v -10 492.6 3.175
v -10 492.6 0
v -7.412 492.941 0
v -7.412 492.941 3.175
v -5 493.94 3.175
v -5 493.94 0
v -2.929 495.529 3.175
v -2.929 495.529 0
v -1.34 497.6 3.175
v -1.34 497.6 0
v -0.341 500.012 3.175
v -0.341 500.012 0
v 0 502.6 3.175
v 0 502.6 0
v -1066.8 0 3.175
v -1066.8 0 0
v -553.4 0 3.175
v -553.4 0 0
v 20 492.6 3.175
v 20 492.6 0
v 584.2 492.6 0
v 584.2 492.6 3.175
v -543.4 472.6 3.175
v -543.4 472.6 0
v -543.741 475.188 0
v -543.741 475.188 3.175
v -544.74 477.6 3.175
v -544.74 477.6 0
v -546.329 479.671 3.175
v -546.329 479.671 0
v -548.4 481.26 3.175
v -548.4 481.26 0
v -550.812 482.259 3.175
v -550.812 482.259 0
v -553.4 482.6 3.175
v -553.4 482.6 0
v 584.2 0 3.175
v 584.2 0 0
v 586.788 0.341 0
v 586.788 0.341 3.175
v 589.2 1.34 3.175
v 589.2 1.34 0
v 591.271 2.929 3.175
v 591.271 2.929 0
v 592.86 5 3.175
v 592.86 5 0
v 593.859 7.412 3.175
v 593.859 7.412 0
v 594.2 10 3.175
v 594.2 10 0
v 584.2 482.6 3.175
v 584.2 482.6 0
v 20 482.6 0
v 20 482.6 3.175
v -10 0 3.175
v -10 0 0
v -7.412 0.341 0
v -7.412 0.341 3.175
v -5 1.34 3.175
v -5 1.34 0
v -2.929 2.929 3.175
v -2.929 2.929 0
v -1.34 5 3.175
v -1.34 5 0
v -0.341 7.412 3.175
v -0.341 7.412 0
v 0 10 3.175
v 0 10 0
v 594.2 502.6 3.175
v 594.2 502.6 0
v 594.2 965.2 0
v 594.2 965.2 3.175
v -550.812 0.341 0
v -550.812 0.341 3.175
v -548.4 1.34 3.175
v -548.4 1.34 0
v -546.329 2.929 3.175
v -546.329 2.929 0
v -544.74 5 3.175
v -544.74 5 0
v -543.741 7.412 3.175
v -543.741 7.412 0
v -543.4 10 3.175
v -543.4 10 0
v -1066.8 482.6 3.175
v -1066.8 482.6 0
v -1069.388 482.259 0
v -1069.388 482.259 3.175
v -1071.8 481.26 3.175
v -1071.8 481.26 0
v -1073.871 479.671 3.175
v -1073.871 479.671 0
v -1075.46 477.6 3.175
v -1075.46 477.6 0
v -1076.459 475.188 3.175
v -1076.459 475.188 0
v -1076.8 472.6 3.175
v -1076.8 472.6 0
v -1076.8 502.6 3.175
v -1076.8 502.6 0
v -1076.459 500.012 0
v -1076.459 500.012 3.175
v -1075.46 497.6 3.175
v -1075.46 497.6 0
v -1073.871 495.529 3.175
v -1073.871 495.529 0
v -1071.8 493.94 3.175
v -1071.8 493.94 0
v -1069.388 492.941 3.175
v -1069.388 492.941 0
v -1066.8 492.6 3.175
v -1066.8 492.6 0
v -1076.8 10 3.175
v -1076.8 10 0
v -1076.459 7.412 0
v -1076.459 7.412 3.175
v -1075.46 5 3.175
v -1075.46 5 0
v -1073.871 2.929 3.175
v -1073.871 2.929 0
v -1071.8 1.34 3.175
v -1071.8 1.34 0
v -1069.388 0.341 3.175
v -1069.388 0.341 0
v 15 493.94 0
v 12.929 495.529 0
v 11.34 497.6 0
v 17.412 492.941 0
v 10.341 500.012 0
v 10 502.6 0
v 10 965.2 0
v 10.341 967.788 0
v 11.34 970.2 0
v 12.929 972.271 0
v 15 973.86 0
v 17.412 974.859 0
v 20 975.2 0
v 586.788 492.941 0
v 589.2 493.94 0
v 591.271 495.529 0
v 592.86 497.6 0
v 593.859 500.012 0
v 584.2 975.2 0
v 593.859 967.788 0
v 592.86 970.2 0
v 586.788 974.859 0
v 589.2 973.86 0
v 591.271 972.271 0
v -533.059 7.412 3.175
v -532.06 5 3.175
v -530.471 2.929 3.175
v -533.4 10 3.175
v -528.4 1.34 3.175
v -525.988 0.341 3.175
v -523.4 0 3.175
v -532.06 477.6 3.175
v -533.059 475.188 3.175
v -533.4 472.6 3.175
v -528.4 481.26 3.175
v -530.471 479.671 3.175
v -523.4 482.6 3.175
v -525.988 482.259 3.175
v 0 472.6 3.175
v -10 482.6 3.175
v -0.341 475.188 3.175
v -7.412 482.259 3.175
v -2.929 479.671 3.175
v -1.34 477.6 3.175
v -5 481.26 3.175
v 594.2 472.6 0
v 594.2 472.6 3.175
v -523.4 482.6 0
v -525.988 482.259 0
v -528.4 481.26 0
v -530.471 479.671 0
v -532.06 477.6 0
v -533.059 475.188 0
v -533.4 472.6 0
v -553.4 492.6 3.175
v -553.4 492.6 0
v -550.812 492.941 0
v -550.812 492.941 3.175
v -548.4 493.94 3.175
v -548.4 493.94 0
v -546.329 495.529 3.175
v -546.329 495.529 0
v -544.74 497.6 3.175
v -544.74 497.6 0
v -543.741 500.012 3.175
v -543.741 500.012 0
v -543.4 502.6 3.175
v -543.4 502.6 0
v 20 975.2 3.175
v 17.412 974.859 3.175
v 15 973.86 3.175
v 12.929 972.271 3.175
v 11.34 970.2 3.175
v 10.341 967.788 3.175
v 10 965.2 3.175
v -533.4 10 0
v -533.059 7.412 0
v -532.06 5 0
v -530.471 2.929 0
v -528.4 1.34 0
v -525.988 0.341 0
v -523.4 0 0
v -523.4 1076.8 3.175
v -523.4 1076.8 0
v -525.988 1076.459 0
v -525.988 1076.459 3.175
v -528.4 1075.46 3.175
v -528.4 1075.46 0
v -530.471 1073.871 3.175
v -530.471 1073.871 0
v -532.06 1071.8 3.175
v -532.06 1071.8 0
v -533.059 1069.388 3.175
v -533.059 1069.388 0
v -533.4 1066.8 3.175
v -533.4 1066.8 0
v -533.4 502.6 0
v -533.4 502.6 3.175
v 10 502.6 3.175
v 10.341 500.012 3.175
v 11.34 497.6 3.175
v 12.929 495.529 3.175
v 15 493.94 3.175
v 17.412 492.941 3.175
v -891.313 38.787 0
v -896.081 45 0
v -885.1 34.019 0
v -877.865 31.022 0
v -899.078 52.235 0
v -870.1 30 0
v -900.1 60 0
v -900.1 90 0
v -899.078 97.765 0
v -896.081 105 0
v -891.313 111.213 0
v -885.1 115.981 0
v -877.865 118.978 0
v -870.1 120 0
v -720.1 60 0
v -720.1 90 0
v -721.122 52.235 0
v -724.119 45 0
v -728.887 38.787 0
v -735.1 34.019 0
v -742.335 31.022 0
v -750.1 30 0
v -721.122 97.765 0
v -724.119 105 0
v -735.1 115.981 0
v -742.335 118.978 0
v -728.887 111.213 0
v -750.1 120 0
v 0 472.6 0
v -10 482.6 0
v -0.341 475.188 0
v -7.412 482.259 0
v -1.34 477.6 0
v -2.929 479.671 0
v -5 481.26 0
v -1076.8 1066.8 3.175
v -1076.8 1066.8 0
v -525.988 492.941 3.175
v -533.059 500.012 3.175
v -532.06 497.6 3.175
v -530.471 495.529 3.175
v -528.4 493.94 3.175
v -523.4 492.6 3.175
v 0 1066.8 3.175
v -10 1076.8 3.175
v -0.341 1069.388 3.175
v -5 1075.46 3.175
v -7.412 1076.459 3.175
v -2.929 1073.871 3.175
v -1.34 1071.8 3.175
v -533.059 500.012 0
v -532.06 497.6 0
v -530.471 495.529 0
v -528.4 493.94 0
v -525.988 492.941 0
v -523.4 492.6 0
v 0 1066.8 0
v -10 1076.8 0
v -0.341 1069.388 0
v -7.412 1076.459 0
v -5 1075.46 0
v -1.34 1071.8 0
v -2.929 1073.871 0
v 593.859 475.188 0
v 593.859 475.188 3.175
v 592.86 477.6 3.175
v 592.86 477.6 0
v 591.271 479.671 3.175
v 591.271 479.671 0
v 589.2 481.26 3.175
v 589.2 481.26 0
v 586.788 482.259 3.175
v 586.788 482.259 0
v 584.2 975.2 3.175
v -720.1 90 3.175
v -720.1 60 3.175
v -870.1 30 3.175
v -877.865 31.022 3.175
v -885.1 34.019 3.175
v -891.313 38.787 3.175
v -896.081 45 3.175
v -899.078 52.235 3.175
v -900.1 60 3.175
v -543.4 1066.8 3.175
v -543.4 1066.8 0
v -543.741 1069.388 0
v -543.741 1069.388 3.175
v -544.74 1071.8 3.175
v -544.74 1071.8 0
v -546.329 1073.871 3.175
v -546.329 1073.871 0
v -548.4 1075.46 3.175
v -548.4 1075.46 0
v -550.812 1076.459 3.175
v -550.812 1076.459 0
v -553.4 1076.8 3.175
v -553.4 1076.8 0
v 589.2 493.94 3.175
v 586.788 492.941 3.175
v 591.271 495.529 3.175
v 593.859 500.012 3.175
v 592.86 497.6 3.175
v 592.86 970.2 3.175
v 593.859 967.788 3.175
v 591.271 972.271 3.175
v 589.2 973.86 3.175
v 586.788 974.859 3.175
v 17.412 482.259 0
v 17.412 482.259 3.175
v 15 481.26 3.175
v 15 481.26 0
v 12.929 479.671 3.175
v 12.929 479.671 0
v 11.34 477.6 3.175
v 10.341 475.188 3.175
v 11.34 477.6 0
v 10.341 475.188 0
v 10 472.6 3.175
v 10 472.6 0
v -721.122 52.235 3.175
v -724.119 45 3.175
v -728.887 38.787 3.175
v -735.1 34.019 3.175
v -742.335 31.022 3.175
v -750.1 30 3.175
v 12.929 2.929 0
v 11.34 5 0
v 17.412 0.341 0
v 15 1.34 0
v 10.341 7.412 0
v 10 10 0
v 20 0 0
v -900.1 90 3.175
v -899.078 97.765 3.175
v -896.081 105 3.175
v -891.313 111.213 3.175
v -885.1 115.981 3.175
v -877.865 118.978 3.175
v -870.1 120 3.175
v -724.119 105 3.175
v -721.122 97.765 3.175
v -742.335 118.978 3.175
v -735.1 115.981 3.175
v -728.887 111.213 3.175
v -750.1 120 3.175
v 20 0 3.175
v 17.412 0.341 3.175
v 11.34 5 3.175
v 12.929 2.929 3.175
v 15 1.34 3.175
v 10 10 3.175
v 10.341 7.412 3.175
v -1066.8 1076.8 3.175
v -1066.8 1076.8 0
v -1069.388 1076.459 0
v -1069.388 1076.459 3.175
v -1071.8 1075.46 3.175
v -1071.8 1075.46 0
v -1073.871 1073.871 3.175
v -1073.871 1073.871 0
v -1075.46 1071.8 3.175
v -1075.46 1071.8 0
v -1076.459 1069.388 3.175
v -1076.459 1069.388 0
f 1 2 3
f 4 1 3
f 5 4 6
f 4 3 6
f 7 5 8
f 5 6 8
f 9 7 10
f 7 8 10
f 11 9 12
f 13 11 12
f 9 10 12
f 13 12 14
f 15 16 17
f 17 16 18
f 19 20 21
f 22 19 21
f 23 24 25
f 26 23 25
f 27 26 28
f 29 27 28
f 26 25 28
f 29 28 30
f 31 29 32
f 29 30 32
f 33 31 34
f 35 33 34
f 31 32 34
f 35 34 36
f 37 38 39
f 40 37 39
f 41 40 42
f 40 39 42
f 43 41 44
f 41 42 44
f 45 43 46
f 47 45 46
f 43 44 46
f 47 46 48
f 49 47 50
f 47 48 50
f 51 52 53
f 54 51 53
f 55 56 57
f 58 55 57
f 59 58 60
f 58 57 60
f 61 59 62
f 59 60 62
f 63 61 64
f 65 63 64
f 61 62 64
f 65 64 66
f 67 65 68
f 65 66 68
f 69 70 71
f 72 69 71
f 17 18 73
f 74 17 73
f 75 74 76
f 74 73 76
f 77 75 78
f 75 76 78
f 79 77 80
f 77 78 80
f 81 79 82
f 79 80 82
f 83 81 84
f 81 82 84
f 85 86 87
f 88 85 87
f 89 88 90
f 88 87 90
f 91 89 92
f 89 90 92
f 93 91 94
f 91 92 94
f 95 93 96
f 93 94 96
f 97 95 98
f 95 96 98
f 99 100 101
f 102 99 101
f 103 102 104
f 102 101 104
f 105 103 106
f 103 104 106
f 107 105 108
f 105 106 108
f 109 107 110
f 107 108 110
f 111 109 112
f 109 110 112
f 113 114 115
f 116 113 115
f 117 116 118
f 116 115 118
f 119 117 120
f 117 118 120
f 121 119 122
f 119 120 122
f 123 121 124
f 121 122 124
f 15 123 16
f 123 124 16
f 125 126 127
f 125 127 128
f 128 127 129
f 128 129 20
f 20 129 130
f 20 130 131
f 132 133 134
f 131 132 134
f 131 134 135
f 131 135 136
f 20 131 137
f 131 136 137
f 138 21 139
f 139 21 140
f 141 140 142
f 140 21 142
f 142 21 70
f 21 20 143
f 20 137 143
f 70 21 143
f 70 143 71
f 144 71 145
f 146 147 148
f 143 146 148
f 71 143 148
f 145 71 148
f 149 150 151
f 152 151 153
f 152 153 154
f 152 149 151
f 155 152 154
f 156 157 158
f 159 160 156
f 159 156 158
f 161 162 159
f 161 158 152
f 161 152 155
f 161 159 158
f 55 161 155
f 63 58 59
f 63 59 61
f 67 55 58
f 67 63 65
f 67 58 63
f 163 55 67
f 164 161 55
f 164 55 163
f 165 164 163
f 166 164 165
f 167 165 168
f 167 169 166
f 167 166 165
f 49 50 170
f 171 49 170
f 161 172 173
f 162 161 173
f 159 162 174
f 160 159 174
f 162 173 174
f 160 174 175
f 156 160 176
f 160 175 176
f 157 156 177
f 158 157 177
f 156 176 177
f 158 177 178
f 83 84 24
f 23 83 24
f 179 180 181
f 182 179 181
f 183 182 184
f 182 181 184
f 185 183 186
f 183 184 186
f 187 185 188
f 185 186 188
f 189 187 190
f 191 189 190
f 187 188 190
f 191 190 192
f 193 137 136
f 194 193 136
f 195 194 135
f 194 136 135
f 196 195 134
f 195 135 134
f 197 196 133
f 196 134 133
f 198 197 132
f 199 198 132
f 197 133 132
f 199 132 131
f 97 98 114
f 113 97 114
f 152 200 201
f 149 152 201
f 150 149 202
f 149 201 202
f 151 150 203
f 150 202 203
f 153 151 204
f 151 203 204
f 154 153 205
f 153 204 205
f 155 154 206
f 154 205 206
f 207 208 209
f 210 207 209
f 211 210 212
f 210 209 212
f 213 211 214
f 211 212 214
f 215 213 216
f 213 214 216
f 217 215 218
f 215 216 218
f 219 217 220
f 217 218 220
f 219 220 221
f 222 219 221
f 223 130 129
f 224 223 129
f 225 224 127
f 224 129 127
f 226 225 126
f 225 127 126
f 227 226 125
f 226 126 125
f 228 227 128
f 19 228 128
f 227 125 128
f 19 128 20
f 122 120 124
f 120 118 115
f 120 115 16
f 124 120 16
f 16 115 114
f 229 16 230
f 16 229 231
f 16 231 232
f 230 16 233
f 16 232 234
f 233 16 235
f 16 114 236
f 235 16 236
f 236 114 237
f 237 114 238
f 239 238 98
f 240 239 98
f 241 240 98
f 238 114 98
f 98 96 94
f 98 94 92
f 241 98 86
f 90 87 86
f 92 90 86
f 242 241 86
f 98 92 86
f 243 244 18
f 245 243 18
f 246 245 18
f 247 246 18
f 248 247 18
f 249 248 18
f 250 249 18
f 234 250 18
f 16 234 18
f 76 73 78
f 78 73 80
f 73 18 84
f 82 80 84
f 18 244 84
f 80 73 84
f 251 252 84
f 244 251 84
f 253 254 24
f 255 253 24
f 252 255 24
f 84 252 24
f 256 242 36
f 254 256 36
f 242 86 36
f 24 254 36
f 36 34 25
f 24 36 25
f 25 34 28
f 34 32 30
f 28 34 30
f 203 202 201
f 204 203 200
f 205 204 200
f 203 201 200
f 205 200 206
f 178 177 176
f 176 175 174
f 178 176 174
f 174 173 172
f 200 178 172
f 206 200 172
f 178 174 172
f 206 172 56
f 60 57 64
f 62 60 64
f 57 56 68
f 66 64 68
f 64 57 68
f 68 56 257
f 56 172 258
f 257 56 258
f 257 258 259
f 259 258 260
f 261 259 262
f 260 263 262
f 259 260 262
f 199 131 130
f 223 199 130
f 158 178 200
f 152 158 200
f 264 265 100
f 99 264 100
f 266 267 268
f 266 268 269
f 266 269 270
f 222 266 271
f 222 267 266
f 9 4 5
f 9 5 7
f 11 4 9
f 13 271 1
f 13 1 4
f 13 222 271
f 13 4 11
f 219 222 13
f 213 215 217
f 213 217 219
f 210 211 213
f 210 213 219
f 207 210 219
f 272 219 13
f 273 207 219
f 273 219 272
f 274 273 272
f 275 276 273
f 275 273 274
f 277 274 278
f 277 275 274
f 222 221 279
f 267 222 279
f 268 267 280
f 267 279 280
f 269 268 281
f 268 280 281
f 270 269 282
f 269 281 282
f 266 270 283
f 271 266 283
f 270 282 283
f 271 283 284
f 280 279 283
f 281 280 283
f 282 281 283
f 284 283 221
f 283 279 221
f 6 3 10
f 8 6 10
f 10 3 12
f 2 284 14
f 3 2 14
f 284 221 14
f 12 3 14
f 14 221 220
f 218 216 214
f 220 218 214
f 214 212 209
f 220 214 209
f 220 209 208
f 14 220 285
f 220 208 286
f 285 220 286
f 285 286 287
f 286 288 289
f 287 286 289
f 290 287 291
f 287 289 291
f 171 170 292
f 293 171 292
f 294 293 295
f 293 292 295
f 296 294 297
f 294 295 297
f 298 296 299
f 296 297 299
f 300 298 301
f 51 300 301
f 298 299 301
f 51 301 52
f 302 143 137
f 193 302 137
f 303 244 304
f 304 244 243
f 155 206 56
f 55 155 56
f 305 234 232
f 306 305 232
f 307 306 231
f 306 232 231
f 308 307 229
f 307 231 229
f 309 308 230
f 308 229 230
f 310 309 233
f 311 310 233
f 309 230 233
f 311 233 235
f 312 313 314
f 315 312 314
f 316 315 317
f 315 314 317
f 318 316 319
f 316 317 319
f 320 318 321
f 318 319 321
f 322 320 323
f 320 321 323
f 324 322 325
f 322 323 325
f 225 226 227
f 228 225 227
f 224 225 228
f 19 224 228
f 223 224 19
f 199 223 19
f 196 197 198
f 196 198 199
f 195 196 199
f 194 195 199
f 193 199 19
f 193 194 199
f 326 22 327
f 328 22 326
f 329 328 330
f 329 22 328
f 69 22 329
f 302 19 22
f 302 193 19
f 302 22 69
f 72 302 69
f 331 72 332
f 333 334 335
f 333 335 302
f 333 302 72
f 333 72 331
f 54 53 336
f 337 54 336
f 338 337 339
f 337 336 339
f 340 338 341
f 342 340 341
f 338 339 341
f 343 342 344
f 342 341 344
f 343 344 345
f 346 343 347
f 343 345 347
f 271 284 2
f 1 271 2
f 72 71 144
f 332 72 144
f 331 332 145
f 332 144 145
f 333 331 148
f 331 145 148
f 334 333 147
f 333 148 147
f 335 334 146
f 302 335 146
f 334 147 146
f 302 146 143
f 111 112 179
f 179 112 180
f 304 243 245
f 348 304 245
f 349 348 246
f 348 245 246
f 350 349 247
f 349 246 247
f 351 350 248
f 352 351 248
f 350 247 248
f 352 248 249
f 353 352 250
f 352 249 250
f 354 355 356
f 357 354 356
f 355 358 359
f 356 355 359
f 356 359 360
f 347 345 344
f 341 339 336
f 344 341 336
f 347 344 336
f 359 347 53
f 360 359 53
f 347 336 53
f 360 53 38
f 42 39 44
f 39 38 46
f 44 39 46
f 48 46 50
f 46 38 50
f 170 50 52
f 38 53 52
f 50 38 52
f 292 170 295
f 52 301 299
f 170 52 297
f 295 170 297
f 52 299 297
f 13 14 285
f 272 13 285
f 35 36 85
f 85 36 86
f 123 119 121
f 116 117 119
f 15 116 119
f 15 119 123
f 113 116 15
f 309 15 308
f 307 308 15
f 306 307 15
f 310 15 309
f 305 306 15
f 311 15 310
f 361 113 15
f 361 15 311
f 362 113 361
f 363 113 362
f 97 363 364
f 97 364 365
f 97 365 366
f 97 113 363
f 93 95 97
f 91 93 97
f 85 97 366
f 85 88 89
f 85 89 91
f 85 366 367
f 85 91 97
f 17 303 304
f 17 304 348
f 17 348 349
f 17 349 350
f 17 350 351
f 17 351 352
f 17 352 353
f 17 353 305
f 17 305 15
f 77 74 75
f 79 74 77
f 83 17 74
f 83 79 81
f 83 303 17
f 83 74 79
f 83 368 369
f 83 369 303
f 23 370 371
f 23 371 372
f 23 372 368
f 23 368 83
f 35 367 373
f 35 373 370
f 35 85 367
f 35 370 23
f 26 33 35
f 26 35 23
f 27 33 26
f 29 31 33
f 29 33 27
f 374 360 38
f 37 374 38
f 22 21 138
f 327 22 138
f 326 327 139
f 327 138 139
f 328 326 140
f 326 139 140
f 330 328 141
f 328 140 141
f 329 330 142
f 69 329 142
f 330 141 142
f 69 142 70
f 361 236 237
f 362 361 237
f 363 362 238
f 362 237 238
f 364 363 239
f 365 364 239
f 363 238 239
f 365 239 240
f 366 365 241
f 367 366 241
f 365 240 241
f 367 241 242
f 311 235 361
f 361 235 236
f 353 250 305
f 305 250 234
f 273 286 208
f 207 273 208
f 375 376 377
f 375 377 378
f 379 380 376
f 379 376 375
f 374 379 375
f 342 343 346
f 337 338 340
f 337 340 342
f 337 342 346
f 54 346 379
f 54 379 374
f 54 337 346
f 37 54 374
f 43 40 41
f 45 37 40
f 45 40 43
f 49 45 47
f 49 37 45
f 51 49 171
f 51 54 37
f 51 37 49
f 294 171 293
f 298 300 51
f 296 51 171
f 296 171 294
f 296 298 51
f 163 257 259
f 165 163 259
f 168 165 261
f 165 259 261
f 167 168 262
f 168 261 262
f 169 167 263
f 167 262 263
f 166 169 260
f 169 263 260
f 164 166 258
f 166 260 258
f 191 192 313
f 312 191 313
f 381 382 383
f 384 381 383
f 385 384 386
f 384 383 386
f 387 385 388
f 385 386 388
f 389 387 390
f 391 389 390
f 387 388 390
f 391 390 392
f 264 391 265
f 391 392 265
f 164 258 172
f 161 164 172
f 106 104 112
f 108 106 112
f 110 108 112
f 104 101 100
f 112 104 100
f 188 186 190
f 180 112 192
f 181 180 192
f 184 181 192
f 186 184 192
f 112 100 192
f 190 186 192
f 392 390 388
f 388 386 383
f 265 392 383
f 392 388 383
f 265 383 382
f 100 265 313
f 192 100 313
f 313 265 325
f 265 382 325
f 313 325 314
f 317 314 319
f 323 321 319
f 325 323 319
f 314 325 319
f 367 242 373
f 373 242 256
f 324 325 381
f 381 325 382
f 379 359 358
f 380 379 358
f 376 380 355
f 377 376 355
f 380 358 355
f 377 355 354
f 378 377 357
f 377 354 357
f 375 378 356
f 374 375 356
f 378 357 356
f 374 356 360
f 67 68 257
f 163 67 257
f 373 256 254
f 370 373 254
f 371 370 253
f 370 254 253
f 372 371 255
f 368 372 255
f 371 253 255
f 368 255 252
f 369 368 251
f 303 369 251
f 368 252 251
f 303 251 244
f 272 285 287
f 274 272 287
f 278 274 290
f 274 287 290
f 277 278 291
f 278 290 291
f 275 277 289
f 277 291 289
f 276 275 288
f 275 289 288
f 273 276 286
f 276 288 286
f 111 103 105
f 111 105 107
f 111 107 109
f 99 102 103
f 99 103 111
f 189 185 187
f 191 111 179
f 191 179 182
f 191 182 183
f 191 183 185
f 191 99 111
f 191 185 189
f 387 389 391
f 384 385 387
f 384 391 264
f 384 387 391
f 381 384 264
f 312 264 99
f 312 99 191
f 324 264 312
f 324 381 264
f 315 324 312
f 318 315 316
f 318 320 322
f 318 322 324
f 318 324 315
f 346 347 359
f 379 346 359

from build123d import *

# Parameters (mm, degrees)
F1_DEPTH = 3.175


# Not quite as in the source:
# - a length typed as a fraction of an inch, garbled in the dataset ("3 / 203.2 mm" for 3/8 in), is restored
# - a feature names something its author has since deleted; it is built from what else it names


with BuildPart() as f1:
    # F0 (on Top) → F1 (new body)
    with BuildSketch(Plane.XY):
        with BuildLine():
            Line((-10, 1076.8), (-523.4, 1076.8))
            ThreePointArc((-523.4, 1076.8), (-530.4710678119, 1073.8710678119), (-533.4, 1066.8))
            Line((-533.4, 1066.8), (-533.4, 502.6))
            ThreePointArc((-533.4, 502.6), (-530.4710678119, 495.5289321881), (-523.4, 492.6))
            Line((-523.4, 492.6), (-10, 492.6))
            ThreePointArc((-10, 492.6), (-2.9289321881, 495.5289321881), (0, 502.6))
            Line((0, 502.6), (0, 1066.8))
            ThreePointArc((0, 1066.8), (-2.9289321881, 1073.8710678119), (-10, 1076.8))
        make_face()
    extrude(amount=F1_DEPTH)


with BuildPart() as f1b:
    # F0 (on Top) → F1, piece 2 (new body)
    with BuildSketch(Plane.XY):
        with BuildLine():
            Line((-10, 482.6), (-523.4, 482.6))
            ThreePointArc((-523.4, 482.6), (-530.4710678119, 479.6710678119), (-533.4, 472.6))
            Line((-533.4, 472.6), (-533.4, 10))
            ThreePointArc((-533.4, 10), (-530.4710678119, 2.9289321881), (-523.4, 0))
            Line((-523.4, 0), (-10, 0))
            ThreePointArc((-10, 0), (-2.9289321881, 2.9289321881), (0, 10))
            Line((0, 10), (0, 472.6))
            ThreePointArc((0, 472.6), (-2.9289321881, 479.6710678119), (-10, 482.6))
        make_face()
    extrude(amount=F1_DEPTH)


with BuildPart() as f1c:
    # F0 (on Top) → F1, piece 3 (new body)
    with BuildSketch(Plane.XY):
        with BuildLine():
            Line((584.2, 482.6), (20, 482.6))
            ThreePointArc((20, 482.6), (12.9289321881, 479.6710678119), (10, 472.6))
            Line((10, 472.6), (10, 10))
            ThreePointArc((10, 10), (12.9289321881, 2.9289321881), (20, 0))
            Line((20, 0), (584.2, 0))
            ThreePointArc((584.2, 0), (591.2710678119, 2.9289321881), (594.2, 10))
            Line((594.2, 10), (594.2, 472.6))
            ThreePointArc((594.2, 472.6), (591.2710678119, 479.6710678119), (584.2, 482.6))
        make_face()
    extrude(amount=F1_DEPTH)


with BuildPart() as f1d:
    # F0 (on Top) → F1, piece 4 (new body)
    with BuildSketch(Plane.XY):
        with BuildLine():
            ThreePointArc((-543.4, 1066.8), (-546.3289321881, 1073.8710678119), (-553.4, 1076.8))
            Line((-553.4, 1076.8), (-1066.8, 1076.8))
            ThreePointArc((-1066.8, 1076.8), (-1073.8710678119, 1073.8710678119), (-1076.8, 1066.8))
            Line((-1076.8, 1066.8), (-1076.8, 502.6))
            ThreePointArc((-1076.8, 502.6), (-1073.8710678119, 495.5289321881), (-1066.8, 492.6))
            Line((-1066.8, 492.6), (-553.4, 492.6))
            ThreePointArc((-553.4, 492.6), (-546.3289321881, 495.5289321881), (-543.4, 502.6))
            Line((-543.4, 502.6), (-543.4, 1066.8))
        make_face()
    extrude(amount=F1_DEPTH)


with BuildPart() as f1e:
    # F0 (on Top) → F1, piece 5 (new body)
    with BuildSketch(Plane.XY):
        with BuildLine():
            Line((-1066.8, 0), (-553.4, 0))
            ThreePointArc((-553.4, 0), (-546.3289321881, 2.9289321881), (-543.4, 10))
            Line((-543.4, 10), (-543.4, 472.6))
            ThreePointArc((-543.4, 472.6), (-546.3289321881, 479.6710678119), (-553.4, 482.6))
            Line((-553.4, 482.6), (-1066.8, 482.6))
            ThreePointArc((-1066.8, 482.6), (-1073.8710678119, 479.6710678119), (-1076.8, 472.6))
            Line((-1076.8, 472.6), (-1076.8, 10))
            ThreePointArc((-1076.8, 10), (-1073.8710678119, 2.9289321881), (-1066.8, 0))
        make_face()
        with BuildLine():
            ThreePointArc((-900.1, 90), (-891.3132034356, 111.2132034356), (-870.1, 120))
            Line((-870.1, 120), (-750.1, 120))
            ThreePointArc((-750.1, 120), (-728.8867965644, 111.2132034356), (-720.1, 90))
            Line((-720.1, 90), (-720.1, 60))
            ThreePointArc((-720.1, 60), (-728.8867965644, 38.7867965644), (-750.1, 30))
            Line((-750.1, 30), (-870.1, 30))
            ThreePointArc((-870.1, 30), (-891.3132034356, 38.7867965644), (-900.1, 60))
            Line((-900.1, 60), (-900.1, 90))
        make_face(mode=Mode.SUBTRACT)
    extrude(amount=F1_DEPTH)


with BuildPart() as f1f:
    # F0 (on Top) → F1, piece 6 (new body)
    with BuildSketch(Plane.XY):
        with BuildLine():
            ThreePointArc((10, 502.6), (12.9289321881, 495.5289321881), (20, 492.6))
            Line((20, 492.6), (584.2, 492.6))
            ThreePointArc((584.2, 492.6), (591.2710678119, 495.5289321881), (594.2, 502.6))
            Line((594.2, 502.6), (594.2, 965.2))
            ThreePointArc((594.2, 965.2), (591.2710678119, 972.2710678119), (584.2, 975.2))
            Line((584.2, 975.2), (20, 975.2))
            ThreePointArc((20, 975.2), (12.9289321881, 972.2710678119), (10, 965.2))
            Line((10, 965.2), (10, 502.6))
        make_face()
    extrude(amount=F1_DEPTH)


solid = Compound([f1.part, f1b.part, f1c.part, f1d.part, f1e.part, f1f.part])
